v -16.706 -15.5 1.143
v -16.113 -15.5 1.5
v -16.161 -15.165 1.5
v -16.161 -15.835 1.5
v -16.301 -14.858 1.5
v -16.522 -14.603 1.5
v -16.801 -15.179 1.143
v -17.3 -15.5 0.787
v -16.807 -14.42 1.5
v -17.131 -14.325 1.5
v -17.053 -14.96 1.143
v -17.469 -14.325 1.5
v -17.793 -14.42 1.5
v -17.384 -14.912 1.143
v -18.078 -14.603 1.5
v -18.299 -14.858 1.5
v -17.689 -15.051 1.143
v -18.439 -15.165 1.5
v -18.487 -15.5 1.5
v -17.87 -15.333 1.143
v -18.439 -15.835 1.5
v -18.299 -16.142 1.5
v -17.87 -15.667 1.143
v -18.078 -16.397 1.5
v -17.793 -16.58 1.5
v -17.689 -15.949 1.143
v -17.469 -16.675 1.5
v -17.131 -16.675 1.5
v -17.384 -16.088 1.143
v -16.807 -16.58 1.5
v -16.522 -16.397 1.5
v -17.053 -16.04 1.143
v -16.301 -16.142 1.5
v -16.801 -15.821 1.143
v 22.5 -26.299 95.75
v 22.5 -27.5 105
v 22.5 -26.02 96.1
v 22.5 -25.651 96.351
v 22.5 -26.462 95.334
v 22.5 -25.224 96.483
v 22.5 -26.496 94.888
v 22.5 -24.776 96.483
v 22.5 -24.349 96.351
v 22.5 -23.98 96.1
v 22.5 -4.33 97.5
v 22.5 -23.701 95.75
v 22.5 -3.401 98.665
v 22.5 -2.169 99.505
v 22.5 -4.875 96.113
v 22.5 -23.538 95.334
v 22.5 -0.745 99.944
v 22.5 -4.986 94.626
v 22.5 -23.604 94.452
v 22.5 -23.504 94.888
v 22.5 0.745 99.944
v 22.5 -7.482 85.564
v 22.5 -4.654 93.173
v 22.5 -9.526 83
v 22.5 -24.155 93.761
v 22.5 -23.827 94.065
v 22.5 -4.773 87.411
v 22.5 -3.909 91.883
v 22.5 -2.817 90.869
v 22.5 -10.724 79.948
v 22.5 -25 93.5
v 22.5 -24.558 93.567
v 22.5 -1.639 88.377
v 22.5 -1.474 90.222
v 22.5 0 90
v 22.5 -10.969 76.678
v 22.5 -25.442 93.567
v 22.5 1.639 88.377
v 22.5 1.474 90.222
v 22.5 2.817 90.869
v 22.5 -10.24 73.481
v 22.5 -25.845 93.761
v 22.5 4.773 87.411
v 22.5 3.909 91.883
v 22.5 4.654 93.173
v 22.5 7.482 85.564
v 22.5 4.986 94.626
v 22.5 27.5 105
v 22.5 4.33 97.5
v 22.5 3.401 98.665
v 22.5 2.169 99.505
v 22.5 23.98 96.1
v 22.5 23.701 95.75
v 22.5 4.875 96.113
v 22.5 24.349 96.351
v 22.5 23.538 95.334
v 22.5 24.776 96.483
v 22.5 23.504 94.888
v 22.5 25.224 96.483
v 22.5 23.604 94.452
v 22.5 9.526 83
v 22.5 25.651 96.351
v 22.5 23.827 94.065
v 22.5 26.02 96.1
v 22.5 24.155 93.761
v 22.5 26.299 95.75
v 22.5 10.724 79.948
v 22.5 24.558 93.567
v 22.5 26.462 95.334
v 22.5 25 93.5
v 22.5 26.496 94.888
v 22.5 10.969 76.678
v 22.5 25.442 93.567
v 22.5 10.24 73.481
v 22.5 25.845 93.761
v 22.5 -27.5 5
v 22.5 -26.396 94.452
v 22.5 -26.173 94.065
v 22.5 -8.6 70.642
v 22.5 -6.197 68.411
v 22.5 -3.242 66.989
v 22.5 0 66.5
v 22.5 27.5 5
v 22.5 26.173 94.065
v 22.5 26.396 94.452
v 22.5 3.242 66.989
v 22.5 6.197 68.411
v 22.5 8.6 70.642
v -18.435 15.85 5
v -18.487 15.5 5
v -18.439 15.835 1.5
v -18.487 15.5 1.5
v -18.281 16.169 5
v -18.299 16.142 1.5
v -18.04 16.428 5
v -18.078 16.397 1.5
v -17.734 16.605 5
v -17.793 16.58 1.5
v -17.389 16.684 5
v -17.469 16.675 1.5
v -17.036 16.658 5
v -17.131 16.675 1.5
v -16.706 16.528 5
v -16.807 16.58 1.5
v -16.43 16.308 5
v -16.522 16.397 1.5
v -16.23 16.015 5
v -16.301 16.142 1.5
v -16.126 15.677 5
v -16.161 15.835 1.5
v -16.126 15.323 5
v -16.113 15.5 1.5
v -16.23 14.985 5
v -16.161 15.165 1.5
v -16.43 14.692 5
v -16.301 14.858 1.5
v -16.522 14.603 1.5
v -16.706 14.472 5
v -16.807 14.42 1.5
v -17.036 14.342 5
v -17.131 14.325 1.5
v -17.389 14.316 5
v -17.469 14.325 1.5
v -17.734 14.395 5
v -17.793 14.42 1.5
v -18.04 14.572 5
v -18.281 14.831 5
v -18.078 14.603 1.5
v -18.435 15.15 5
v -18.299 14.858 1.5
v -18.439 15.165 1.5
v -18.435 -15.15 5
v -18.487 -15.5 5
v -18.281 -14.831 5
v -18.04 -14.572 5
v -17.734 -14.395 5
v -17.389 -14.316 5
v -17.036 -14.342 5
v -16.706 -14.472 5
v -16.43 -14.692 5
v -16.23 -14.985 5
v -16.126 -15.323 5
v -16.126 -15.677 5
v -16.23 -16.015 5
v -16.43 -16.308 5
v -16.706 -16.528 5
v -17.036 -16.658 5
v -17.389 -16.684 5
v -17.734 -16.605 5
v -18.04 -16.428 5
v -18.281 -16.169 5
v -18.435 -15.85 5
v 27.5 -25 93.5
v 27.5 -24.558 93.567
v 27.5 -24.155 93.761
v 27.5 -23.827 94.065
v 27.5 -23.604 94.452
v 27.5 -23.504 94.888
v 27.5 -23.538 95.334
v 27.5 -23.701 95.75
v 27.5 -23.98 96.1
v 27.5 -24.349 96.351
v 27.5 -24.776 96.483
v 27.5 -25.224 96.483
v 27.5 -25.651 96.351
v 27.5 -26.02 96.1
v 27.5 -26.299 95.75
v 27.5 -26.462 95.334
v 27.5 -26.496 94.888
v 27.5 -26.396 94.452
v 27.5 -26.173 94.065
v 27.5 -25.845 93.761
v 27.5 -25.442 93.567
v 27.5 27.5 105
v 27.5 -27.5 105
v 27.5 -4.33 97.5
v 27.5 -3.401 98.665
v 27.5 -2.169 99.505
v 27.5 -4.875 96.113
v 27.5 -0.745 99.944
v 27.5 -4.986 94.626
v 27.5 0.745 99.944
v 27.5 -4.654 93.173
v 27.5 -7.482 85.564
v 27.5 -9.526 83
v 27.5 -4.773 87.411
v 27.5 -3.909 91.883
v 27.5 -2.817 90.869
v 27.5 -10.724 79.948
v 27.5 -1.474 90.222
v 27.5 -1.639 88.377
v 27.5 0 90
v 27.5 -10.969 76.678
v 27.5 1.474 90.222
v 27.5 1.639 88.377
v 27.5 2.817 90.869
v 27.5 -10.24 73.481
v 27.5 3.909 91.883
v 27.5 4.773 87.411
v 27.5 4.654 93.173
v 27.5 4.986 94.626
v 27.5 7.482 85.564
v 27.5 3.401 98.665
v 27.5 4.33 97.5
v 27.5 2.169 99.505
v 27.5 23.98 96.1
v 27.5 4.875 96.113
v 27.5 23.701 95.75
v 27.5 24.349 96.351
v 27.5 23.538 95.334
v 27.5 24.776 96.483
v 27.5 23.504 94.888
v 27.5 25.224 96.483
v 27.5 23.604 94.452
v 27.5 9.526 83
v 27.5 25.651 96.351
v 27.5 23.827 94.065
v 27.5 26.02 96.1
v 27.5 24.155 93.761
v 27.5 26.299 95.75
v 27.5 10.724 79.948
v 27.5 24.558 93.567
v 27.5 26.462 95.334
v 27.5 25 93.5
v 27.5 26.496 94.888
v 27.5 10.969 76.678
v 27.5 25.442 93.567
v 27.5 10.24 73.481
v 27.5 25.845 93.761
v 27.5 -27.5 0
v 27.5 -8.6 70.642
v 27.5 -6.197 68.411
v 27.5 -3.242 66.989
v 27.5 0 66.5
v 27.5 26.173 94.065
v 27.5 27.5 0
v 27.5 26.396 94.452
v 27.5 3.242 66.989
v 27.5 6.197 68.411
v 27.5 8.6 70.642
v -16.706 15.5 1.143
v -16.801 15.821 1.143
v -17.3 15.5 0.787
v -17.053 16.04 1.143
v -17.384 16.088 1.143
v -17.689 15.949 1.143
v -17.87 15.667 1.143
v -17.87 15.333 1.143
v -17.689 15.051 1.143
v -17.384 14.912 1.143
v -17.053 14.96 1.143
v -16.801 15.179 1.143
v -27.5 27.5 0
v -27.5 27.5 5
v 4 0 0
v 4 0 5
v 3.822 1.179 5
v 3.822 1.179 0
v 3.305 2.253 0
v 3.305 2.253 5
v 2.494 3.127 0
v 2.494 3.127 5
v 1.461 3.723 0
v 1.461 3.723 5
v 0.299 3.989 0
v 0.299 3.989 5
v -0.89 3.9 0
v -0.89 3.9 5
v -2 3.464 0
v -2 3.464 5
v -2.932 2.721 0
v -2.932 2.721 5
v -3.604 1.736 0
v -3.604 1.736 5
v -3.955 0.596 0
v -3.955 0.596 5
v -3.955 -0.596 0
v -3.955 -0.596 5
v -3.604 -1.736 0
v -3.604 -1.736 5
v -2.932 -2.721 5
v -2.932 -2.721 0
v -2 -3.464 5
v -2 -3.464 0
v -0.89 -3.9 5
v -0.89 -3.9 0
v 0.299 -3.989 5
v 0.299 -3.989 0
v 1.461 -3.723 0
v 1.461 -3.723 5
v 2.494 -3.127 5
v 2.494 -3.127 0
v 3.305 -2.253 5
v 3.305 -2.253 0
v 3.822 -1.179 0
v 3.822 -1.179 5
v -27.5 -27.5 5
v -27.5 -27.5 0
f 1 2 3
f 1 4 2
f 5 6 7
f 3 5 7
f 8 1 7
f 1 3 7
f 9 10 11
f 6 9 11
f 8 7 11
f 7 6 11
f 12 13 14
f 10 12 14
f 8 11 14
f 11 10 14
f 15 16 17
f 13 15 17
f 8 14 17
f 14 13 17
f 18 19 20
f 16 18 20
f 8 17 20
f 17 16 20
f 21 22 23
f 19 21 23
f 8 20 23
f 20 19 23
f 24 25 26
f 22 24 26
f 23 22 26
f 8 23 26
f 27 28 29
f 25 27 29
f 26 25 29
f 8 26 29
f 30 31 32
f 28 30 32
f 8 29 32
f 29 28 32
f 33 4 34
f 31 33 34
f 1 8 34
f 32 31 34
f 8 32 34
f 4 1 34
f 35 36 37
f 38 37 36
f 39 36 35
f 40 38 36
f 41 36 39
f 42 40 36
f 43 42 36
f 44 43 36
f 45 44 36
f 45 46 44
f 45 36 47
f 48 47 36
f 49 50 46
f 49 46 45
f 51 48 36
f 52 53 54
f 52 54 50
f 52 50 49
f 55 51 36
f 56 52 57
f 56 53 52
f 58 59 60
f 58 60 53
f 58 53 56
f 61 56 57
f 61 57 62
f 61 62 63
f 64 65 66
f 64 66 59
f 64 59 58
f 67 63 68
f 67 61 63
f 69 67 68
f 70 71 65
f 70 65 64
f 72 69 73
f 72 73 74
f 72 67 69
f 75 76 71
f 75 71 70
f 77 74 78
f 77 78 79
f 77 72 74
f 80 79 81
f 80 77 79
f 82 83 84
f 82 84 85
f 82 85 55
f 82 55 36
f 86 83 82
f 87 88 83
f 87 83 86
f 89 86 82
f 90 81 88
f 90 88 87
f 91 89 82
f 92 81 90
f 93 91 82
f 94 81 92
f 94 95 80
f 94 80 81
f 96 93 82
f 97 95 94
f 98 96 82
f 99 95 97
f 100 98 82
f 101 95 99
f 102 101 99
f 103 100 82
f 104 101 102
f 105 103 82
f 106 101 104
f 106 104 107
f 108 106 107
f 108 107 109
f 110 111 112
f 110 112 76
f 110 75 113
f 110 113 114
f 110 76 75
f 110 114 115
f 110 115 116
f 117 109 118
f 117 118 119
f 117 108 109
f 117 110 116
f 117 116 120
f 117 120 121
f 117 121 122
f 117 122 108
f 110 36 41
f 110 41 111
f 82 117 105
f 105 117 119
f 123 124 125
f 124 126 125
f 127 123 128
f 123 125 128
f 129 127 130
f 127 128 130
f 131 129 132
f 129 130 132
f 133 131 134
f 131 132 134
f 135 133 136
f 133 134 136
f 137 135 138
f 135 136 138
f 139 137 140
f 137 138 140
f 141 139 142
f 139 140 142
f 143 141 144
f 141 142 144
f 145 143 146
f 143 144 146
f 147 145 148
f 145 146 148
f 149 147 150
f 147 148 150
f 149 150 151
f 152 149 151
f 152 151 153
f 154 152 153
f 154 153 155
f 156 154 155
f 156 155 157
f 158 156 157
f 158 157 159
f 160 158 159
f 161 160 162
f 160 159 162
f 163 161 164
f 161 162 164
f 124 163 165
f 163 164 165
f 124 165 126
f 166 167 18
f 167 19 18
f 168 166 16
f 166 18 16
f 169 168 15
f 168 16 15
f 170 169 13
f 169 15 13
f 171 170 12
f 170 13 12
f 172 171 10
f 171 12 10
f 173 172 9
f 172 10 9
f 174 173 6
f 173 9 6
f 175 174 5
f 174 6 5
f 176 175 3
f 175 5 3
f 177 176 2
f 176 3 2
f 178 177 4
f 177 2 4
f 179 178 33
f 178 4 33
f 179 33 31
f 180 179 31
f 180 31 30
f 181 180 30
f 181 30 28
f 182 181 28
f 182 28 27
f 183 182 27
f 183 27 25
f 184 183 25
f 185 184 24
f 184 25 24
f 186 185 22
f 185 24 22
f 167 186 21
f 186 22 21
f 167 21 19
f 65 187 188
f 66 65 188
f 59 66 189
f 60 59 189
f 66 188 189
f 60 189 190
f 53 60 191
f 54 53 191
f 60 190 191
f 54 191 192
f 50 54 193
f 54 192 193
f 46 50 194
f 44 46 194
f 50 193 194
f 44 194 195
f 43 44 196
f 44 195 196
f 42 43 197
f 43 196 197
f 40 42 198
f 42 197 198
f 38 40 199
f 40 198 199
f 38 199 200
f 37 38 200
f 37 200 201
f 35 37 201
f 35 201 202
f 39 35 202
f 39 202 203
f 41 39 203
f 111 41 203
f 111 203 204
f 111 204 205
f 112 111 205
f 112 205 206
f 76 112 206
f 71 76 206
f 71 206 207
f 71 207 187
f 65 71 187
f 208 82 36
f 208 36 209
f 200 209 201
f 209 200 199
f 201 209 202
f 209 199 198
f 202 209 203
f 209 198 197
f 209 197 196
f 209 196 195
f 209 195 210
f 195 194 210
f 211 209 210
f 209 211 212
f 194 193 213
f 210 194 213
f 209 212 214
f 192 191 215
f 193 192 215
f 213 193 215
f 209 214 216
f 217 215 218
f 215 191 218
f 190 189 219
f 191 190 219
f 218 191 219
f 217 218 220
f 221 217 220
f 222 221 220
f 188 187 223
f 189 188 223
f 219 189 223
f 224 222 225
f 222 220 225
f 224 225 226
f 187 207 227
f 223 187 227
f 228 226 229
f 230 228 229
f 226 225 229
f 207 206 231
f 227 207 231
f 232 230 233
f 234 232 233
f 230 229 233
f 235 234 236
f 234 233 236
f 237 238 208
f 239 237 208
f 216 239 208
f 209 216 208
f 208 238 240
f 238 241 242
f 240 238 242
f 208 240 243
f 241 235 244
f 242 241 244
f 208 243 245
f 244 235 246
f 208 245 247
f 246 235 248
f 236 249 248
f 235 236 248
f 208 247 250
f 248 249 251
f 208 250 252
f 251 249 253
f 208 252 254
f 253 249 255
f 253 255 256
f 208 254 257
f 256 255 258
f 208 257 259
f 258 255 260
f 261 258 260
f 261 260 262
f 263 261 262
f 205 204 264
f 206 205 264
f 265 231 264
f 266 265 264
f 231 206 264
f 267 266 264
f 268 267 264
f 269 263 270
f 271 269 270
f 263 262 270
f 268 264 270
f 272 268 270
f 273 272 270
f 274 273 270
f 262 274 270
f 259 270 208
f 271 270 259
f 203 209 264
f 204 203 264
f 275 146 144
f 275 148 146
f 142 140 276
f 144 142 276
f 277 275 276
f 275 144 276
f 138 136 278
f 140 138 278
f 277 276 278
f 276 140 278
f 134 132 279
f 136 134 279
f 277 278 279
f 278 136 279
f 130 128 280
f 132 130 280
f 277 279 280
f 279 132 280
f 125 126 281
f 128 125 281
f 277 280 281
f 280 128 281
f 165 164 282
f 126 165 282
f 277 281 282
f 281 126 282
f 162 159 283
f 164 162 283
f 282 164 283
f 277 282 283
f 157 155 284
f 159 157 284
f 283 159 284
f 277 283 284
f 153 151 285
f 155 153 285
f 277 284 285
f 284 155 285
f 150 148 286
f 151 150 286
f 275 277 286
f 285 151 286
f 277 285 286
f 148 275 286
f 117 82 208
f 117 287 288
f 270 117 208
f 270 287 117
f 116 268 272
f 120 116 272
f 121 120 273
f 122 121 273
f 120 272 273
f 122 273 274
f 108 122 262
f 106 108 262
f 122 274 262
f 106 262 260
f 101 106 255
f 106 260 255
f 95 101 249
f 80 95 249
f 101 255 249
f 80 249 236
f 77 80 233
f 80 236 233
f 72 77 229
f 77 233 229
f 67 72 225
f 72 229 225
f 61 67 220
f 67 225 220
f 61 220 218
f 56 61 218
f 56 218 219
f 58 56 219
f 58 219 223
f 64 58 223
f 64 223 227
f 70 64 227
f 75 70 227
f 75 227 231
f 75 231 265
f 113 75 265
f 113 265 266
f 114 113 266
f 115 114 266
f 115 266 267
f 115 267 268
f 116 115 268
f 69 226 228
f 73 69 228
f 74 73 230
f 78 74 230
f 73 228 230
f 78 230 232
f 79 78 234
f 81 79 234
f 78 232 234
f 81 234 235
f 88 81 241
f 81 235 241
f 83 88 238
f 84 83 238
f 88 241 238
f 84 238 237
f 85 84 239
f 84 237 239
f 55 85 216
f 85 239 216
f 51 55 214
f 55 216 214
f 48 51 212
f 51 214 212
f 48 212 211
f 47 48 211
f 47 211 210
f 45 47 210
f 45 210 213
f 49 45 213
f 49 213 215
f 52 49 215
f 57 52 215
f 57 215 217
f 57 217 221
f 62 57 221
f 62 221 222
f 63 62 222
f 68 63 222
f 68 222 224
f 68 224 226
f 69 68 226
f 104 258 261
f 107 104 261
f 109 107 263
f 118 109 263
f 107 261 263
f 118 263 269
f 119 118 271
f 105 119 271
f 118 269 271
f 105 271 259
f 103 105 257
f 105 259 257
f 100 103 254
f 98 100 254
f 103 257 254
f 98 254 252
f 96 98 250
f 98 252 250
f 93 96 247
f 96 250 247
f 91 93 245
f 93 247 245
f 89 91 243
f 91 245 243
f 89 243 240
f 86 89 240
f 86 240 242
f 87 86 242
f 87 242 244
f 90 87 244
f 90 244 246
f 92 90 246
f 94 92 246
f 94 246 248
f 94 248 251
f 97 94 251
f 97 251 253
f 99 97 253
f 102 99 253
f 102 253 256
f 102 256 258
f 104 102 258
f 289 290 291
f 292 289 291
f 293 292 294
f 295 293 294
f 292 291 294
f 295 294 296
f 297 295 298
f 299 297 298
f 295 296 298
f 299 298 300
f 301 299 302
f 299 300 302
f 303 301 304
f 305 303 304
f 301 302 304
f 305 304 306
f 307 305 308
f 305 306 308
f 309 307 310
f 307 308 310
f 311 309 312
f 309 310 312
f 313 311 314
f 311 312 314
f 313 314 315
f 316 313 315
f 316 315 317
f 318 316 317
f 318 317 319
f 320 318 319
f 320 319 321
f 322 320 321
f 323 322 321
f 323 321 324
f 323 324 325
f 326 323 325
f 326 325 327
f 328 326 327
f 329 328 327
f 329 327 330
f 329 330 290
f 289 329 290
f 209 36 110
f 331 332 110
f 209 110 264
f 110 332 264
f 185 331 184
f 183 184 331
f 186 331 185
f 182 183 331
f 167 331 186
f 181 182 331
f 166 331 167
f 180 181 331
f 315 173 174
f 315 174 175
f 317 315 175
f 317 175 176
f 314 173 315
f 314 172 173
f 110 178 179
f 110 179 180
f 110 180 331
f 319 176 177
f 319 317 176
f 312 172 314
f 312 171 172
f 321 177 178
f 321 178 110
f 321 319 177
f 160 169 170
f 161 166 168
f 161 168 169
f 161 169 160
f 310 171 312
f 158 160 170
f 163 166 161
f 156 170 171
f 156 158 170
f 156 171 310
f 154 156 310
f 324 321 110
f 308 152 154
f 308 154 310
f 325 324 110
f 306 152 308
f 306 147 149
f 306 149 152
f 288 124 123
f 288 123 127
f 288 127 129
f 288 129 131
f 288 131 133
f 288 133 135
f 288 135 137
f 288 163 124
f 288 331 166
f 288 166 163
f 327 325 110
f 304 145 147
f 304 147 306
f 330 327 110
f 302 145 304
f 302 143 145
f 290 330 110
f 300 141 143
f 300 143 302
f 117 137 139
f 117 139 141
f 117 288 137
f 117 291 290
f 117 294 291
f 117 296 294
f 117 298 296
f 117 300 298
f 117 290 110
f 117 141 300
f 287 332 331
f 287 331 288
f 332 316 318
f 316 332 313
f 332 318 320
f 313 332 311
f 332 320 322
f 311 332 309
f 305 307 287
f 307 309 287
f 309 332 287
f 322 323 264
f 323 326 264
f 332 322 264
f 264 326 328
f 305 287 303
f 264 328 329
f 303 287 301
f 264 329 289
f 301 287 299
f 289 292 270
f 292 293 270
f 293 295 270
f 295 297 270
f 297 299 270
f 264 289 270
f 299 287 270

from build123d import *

# Parameters (mm, degrees)
SKETCH1_W                 = 55
SKETCH1_H                 = 55
BOSS_EXTRUDE1_DEPTH       = 5
SKETCH2_W                 = 5
SKETCH2_H                 = 55
BOSS_EXTRUDE2_DEPTH       = 100
CUT_EXTRUDE1_REACH        = 57
SKETCH3_R                 = 5
SKETCH3_R_2               = 1.5
SKETCH3_R_3               = 11
CUT_EXTRUDE2_REACH        = 7
SKETCH4_R                 = 4
F_4_48_TAPPED_HOLE1_D     = 2.3749
F_4_48_TAPPED_HOLE1_DEPTH = 3.5
F_4_48_TAPPED_HOLE1_TIP   = 0.713491942


with BuildPart() as part:
    # Sketch1 → Boss-Extrude1 (new body)
    with BuildSketch(Plane.XY):
        Rectangle(SKETCH1_W, SKETCH1_H)
    extrude(amount=BOSS_EXTRUDE1_DEPTH)

    # Sketch2 → Boss-Extrude2 (add)
    with BuildSketch(Plane.XY.offset(5)):
        with Locations((25, 0)):
            Rectangle(SKETCH2_W, SKETCH2_H)
    extrude(amount=BOSS_EXTRUDE2_DEPTH)

    # Sketch3 → Cut-Extrude1 (cut, up to next)
    with BuildSketch(Plane(origin=(27.5, 0, 0), x_dir=(0, 0, -1), z_dir=(1, 0, 0)), mode=Mode.PRIVATE) as cut_extrude1_sk1:
        with Locations((-95, 0)):
            Circle(SKETCH3_R)
    cut_extrude1_tool1 = extrude(cut_extrude1_sk1.sketch, amount=-CUT_EXTRUDE1_REACH, mode=Mode.PRIVATE) & part.part
    add(cut_extrude1_tool1.solids().sort_by_distance((27.5, 0, 95))[0], mode=Mode.SUBTRACT)
    # Sketch3 → Cut-Extrude1 (cut, up to next)
    with BuildSketch(Plane(origin=(27.5, 0, 0), x_dir=(0, 0, -1), z_dir=(1, 0, 0)), mode=Mode.PRIVATE) as cut_extrude1_sk2:
        with Locations((-95, 25)):
            Circle(SKETCH3_R_2)
    cut_extrude1_tool2 = extrude(cut_extrude1_sk2.sketch, amount=-CUT_EXTRUDE1_REACH, mode=Mode.PRIVATE) & part.part
    add(cut_extrude1_tool2.solids().sort_by_distance((27.5, 25, 95))[0], mode=Mode.SUBTRACT)
    # Sketch3 → Cut-Extrude1 (cut, up to next)
    with BuildSketch(Plane(origin=(27.5, 0, 0), x_dir=(0, 0, -1), z_dir=(1, 0, 0)), mode=Mode.PRIVATE) as cut_extrude1_sk3:
        with Locations((-95, -25)):
            Circle(SKETCH3_R_2)
    cut_extrude1_tool3 = extrude(cut_extrude1_sk3.sketch, amount=-CUT_EXTRUDE1_REACH, mode=Mode.PRIVATE) & part.part
    add(cut_extrude1_tool3.solids().sort_by_distance((27.5, -25, 95))[0], mode=Mode.SUBTRACT)
    # Sketch3 → Cut-Extrude1 (cut, up to next)
    with BuildSketch(Plane(origin=(27.5, 0, 0), x_dir=(0, 0, -1), z_dir=(1, 0, 0)), mode=Mode.PRIVATE) as cut_extrude1_sk4:
        with Locations((-77.5, 0)):
            Circle(SKETCH3_R_3)
    cut_extrude1_tool4 = extrude(cut_extrude1_sk4.sketch, amount=-CUT_EXTRUDE1_REACH, mode=Mode.PRIVATE) & part.part
    add(cut_extrude1_tool4.solids().sort_by_distance((27.5, 0, 77.5))[0], mode=Mode.SUBTRACT)

    # Sketch4 → Cut-Extrude2 (cut, up to next)
    with BuildSketch(Plane.XY.offset(5), mode=Mode.PRIVATE) as cut_extrude2_sk1:
        Circle(SKETCH4_R)
    cut_extrude2_tool1 = extrude(cut_extrude2_sk1.sketch, amount=-CUT_EXTRUDE2_REACH, mode=Mode.PRIVATE) & part.part
    add(cut_extrude2_tool1.solids().sort_by_distance((0, 0, 5))[0], mode=Mode.SUBTRACT)

    # #4-48 Tapped Hole1
    with Locations(Plane.XY.offset(5)):
        with Locations((-17.3, 15.5), (-17.3, -15.5)):
            Hole(F_4_48_TAPPED_HOLE1_D / 2, depth=F_4_48_TAPPED_HOLE1_DEPTH)
            with Locations((0, 0, -(F_4_48_TAPPED_HOLE1_DEPTH + F_4_48_TAPPED_HOLE1_TIP / 2))):  # 118° drill point
                Cone(0, F_4_48_TAPPED_HOLE1_D / 2, F_4_48_TAPPED_HOLE1_TIP, mode=Mode.SUBTRACT)


solid = part.part
